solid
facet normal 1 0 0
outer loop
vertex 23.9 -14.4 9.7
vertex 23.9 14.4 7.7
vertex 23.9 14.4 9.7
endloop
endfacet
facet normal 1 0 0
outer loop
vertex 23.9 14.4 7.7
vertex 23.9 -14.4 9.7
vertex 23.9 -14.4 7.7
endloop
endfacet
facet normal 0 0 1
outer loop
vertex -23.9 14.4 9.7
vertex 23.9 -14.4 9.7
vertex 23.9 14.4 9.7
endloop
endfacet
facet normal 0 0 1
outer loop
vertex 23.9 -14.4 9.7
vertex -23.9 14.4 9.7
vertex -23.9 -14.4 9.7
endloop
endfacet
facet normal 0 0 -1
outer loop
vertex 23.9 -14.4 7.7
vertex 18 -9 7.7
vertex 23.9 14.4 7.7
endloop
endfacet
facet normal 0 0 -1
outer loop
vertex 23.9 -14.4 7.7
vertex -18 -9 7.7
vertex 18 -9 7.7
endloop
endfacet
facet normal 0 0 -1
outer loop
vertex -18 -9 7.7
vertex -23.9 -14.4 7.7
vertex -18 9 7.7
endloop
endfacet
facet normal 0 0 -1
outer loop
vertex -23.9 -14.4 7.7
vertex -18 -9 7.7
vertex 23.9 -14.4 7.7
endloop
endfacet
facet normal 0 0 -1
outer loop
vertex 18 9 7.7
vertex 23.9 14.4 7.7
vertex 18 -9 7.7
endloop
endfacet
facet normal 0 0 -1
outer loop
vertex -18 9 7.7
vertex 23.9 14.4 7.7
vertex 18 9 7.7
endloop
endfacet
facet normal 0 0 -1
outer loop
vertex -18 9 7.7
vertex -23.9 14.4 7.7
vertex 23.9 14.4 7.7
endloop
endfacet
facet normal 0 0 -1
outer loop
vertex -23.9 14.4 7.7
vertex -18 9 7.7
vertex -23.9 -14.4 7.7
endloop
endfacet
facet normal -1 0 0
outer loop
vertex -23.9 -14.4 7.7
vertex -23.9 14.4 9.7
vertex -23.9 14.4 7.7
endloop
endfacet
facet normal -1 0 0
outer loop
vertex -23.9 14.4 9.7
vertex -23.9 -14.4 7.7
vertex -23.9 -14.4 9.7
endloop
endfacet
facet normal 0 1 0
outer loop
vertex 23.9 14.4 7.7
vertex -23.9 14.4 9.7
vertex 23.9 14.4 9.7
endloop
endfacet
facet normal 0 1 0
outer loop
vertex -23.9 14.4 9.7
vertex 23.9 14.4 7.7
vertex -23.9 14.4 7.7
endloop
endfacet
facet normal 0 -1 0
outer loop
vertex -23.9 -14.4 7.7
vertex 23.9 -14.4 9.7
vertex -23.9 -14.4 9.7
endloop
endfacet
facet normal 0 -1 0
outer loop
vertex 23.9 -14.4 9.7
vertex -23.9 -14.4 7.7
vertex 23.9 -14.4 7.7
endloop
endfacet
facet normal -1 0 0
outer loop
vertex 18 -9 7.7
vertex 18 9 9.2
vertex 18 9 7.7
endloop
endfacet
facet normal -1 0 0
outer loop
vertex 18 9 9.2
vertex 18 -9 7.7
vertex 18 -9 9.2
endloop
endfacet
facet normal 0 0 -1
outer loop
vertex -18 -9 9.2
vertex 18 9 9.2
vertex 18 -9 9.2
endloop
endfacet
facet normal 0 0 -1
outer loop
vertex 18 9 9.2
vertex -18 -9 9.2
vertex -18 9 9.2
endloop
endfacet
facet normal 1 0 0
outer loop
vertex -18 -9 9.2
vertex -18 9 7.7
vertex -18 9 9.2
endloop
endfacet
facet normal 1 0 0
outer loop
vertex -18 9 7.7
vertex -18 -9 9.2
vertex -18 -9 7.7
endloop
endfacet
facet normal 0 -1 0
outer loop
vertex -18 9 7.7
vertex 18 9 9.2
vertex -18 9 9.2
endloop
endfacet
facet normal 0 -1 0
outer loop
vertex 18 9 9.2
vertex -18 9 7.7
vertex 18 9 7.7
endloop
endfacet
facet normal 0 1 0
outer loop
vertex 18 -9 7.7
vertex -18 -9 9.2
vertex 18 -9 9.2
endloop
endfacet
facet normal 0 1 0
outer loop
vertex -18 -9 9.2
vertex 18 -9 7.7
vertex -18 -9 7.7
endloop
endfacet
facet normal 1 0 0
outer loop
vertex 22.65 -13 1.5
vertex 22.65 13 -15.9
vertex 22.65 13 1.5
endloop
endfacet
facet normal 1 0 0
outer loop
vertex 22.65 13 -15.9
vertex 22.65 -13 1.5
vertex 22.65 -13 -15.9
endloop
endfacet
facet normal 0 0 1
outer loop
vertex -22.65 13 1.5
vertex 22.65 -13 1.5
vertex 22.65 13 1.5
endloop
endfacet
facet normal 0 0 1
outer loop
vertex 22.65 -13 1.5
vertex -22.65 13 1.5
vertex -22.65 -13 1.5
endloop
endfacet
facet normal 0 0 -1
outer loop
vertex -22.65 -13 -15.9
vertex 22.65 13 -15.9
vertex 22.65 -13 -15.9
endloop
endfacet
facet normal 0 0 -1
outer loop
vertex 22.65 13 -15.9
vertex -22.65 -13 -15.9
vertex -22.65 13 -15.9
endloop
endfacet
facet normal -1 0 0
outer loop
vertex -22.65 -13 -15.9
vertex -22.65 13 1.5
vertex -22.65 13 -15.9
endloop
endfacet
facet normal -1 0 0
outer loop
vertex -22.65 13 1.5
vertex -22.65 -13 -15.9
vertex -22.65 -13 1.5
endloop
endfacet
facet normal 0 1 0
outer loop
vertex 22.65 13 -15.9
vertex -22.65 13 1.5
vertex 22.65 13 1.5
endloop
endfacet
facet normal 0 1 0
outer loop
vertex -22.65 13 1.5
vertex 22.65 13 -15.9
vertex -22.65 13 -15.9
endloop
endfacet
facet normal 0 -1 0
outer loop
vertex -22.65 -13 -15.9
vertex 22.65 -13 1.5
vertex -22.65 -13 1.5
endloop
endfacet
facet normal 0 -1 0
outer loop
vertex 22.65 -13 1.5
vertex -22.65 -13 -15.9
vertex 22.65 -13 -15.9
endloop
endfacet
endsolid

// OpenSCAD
$fn = 64;

// Main body of the meter
module meter_body() {
    cube([45.3, 26, 17.4], center = true);
}

// Bezel of the meter
module meter_bezel() {
    difference() {
        cube([47.8, 28.8, 2], center = true);
        translate([0, 0, -1])
            cube([36, 18, 3], center = true);
    }
}

// Assemble the meter
module panel_mount_meter() {
    union() {
        translate([0, 0, -7.2])
            meter_body();
        translate([0, 0, 8.7])
            meter_bezel();
    }
}

// Render the meter
panel_mount_meter();
